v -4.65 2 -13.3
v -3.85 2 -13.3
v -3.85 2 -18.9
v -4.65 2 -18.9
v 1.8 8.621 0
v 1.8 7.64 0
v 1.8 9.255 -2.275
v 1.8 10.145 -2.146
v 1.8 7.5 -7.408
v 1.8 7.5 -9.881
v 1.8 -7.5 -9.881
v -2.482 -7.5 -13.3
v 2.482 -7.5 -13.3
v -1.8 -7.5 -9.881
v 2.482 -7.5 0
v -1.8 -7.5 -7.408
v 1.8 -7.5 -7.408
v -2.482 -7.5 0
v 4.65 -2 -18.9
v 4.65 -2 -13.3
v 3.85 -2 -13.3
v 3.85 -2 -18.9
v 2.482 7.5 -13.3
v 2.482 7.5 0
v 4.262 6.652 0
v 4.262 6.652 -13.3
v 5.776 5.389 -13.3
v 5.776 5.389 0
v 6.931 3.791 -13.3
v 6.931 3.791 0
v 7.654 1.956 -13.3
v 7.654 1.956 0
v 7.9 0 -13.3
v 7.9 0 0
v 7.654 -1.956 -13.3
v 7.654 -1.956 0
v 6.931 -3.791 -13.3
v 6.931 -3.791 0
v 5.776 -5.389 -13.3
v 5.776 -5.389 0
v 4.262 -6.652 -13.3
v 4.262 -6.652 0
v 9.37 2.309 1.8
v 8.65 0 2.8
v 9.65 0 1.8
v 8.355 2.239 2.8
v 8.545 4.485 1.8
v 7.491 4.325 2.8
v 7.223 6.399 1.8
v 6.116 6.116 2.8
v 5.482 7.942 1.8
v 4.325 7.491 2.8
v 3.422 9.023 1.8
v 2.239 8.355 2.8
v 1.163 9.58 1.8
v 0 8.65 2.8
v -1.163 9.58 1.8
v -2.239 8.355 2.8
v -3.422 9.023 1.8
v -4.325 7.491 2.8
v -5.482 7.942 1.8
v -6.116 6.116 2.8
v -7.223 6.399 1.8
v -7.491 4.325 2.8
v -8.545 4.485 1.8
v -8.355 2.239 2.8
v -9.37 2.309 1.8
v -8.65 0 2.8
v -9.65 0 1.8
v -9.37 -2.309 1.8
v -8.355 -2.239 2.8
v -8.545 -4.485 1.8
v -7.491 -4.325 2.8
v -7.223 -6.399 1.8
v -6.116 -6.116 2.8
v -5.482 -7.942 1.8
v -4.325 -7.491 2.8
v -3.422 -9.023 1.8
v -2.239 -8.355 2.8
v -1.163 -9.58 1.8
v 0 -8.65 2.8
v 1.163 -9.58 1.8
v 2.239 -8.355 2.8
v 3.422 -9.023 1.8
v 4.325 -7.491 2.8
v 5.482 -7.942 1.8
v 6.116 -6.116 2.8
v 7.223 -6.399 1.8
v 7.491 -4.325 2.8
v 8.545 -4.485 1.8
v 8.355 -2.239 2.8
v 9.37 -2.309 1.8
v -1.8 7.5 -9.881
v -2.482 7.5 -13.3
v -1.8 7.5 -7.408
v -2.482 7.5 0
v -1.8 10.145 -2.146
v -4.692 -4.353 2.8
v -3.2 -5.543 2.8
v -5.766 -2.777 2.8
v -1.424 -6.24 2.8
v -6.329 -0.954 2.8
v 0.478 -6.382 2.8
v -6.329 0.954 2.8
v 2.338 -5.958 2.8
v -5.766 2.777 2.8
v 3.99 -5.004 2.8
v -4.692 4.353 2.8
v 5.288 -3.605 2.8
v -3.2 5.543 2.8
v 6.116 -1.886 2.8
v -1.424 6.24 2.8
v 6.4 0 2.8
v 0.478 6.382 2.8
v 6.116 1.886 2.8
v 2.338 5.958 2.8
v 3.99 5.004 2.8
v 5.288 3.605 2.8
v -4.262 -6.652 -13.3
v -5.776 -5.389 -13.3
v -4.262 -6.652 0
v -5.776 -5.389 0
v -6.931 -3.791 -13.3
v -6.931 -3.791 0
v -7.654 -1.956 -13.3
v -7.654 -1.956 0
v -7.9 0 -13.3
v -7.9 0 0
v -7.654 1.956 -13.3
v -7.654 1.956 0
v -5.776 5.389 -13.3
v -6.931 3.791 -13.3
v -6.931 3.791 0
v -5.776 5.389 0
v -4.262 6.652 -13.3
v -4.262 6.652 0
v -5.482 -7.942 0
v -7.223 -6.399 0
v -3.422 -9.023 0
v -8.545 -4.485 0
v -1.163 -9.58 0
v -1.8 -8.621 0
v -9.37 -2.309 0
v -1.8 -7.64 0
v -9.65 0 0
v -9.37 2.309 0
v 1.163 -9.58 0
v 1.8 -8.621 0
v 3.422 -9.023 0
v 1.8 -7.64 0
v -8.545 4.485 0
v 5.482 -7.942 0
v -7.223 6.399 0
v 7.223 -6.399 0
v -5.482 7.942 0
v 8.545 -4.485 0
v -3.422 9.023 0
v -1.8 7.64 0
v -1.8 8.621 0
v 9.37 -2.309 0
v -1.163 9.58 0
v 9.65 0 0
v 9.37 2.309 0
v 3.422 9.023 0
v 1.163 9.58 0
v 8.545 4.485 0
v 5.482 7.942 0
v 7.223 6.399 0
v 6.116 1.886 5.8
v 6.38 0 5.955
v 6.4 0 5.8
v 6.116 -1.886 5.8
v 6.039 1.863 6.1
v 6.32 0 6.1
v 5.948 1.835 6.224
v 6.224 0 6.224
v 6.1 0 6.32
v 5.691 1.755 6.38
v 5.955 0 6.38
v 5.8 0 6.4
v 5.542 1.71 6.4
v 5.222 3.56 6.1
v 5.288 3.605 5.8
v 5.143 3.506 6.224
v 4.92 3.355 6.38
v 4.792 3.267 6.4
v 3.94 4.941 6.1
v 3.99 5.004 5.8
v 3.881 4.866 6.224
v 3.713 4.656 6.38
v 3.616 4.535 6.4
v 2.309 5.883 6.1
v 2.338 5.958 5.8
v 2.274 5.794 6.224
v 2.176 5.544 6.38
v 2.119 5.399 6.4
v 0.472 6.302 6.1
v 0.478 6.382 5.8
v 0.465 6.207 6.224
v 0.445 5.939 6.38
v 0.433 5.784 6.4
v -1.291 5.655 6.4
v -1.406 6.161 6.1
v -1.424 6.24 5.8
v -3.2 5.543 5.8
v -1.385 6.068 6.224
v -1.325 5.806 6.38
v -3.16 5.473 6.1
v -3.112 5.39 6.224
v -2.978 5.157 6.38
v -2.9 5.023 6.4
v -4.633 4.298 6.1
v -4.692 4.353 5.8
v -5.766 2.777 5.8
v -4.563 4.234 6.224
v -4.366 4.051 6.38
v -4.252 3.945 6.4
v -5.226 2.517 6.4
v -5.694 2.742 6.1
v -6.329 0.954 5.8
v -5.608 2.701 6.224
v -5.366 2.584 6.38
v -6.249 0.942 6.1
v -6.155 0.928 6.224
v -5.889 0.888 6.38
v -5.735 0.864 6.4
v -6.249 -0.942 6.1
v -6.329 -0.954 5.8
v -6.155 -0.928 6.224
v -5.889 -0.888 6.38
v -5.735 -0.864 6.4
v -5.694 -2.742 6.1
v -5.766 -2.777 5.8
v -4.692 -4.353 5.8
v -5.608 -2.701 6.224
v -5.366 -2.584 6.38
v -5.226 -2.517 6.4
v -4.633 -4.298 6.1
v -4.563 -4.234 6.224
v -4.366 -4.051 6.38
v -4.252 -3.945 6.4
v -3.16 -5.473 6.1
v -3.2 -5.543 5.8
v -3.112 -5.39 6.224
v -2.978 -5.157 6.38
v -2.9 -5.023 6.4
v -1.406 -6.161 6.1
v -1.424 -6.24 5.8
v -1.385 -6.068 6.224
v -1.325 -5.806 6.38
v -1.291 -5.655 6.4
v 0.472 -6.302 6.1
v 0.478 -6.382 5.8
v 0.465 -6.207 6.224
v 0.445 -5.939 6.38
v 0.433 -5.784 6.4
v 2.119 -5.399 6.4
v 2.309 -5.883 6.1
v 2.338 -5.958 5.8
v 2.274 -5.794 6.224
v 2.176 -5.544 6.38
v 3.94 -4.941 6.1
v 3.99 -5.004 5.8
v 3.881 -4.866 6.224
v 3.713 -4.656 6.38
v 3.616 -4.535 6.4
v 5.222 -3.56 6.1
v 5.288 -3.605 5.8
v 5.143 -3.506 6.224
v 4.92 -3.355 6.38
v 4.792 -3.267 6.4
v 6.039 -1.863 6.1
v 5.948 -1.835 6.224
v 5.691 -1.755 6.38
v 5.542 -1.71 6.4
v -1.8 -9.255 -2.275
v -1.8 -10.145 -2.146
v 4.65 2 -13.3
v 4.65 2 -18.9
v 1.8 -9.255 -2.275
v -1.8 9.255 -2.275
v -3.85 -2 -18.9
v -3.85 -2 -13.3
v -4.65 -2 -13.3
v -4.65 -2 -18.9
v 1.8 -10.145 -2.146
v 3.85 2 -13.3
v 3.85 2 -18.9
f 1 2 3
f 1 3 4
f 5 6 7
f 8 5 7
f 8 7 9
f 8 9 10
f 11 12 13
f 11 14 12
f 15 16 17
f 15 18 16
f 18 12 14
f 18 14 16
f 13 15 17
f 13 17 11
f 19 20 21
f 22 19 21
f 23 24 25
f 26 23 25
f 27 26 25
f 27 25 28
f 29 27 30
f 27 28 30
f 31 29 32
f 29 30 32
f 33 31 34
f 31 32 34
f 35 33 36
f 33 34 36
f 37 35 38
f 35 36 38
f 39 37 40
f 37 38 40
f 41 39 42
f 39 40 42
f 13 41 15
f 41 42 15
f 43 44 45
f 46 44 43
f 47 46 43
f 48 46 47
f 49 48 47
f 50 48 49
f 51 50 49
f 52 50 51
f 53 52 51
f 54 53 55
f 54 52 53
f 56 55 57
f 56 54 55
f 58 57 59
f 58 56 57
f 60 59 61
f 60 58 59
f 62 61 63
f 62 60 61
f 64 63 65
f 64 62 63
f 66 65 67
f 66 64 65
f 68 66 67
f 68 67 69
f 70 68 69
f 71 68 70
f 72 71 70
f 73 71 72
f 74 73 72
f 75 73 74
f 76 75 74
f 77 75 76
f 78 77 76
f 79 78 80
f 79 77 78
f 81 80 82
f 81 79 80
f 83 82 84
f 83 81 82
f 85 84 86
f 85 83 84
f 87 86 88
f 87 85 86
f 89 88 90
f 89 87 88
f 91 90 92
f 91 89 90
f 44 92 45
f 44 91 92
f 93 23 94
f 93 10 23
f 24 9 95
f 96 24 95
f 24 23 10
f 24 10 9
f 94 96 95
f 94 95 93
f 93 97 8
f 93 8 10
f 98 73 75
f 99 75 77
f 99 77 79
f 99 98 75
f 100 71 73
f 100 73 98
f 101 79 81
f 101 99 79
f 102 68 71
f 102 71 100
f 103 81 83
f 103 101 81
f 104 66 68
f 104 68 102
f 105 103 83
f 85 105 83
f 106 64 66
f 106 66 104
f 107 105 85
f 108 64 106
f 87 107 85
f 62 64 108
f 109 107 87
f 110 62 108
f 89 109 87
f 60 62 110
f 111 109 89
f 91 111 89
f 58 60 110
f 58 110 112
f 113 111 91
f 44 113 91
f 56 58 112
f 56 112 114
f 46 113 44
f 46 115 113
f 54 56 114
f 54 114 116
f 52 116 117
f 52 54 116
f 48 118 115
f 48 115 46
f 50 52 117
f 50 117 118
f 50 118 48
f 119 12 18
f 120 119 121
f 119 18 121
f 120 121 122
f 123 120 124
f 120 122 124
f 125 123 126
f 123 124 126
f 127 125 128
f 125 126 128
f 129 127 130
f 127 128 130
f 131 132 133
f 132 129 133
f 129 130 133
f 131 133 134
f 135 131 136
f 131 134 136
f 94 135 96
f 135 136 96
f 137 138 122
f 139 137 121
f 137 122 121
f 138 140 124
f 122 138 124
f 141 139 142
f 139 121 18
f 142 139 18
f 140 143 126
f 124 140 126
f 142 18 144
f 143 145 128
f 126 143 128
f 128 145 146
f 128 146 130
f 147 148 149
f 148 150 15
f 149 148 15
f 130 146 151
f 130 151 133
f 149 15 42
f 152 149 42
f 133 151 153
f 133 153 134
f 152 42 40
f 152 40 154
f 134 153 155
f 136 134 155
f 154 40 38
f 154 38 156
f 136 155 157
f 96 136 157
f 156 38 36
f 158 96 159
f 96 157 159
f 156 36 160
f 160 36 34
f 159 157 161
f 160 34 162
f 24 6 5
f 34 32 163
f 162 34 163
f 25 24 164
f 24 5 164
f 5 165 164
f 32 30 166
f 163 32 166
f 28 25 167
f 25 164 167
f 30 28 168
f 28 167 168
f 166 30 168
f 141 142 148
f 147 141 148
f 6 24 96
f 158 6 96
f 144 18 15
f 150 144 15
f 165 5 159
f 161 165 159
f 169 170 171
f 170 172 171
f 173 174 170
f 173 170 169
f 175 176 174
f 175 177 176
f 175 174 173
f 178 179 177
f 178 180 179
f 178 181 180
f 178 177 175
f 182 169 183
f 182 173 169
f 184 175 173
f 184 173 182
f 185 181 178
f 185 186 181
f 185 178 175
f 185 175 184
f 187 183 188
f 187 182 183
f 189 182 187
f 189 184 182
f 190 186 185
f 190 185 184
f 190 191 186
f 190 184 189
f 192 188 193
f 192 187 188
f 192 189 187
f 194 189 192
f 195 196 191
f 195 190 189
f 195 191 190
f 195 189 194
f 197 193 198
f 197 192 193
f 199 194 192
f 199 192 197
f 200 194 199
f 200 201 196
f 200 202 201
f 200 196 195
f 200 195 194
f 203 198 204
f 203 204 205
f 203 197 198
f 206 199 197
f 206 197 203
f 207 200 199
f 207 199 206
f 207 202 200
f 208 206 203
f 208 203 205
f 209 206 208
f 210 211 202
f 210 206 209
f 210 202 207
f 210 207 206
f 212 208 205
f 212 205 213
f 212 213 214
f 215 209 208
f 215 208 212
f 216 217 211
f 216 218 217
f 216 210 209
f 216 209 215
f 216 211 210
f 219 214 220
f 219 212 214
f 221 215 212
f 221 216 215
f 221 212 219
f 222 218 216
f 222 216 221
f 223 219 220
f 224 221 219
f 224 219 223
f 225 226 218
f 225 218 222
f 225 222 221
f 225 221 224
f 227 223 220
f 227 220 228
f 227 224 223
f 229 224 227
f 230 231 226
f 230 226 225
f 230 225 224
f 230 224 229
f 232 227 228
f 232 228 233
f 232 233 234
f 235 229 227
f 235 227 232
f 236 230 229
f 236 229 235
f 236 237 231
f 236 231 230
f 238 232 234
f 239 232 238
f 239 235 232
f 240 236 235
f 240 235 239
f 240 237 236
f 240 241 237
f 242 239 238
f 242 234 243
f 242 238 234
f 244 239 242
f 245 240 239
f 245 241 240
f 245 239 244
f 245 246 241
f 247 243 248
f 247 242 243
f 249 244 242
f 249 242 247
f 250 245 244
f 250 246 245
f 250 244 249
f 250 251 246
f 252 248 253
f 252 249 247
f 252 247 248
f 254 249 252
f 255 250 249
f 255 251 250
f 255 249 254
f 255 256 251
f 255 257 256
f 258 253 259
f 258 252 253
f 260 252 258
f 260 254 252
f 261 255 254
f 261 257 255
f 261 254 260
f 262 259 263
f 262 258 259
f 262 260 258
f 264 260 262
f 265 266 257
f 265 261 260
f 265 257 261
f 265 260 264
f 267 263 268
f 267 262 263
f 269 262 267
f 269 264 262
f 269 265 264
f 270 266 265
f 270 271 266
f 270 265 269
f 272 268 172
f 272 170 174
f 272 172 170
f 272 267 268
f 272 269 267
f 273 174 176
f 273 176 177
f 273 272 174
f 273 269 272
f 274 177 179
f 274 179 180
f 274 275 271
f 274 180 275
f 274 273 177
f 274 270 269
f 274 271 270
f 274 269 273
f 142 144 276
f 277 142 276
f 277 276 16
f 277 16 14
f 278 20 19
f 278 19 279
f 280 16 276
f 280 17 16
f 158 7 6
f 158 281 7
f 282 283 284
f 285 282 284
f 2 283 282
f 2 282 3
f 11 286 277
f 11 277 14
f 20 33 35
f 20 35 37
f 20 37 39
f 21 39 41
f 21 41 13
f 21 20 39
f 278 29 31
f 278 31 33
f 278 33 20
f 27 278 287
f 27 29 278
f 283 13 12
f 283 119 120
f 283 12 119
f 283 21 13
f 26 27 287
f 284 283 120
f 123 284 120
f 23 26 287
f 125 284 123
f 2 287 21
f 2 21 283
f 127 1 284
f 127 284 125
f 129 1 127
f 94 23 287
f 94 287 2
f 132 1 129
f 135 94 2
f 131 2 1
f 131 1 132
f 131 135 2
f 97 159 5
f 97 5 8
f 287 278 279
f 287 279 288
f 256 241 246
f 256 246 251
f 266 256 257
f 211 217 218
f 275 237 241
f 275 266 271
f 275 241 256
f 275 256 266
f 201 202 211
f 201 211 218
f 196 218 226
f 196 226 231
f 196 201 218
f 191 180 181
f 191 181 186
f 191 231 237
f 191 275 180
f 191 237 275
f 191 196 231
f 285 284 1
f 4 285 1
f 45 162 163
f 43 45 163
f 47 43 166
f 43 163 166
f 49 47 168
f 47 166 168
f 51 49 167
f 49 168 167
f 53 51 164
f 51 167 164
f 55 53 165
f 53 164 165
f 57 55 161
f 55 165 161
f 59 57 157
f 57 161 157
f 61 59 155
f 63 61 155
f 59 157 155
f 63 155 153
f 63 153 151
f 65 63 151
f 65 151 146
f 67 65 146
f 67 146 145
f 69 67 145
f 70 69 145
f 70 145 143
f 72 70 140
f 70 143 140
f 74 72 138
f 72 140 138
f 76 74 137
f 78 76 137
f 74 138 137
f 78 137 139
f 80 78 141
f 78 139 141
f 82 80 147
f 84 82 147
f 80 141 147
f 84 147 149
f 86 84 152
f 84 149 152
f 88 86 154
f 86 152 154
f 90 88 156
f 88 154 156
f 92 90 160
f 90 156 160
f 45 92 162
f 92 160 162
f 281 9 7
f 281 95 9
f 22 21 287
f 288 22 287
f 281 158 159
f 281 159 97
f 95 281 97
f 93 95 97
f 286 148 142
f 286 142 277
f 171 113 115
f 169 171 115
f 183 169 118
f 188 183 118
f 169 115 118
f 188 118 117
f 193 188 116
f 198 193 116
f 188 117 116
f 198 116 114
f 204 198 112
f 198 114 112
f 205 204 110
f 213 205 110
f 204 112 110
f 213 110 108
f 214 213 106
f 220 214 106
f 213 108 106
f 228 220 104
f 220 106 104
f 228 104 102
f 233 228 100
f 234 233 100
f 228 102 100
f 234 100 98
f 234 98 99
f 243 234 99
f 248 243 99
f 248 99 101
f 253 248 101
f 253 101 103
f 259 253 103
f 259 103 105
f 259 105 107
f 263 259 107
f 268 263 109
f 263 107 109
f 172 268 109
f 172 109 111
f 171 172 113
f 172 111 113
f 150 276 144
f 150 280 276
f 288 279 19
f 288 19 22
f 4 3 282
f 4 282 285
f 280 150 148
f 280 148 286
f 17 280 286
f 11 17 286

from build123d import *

# Parameters (mm, degrees)
SKETCH1_R           = 9.65
BOSS_EXTRUDE1_DEPTH = 2.8
CHAMFER1_SIZE       = 1
SKETCH2_R           = 6.4
BOSS_EXTRUDE2_DEPTH = 3.6
FILLET1_R           = 0.6
SKETCH3_R           = 7.9
BOSS_EXTRUDE3_DEPTH = 13.3
CUT_EXTRUDE1_START  = -13.3
CUT_EXTRUDE1_DEPTH  = 13.3
SKETCH4_W           = 0.8
SKETCH4_H           = 4
BOSS_EXTRUDE4_DEPTH = 5.6
BOSS_EXTRUDE6_DEPTH = 1.8
CIRPATTERN1_COUNT   = 2


with BuildPart() as part:
    # Sketch1 → Boss-Extrude1 (new body)
    with BuildSketch(Plane.XY):
        Circle(SKETCH1_R)
    extrude(amount=BOSS_EXTRUDE1_DEPTH)

    # Chamfer1
    chamfer1_edges = [part.edges().sort_by_distance(p)[0] for p in [
        (-9.65, 0, 2.8),
    ]]
    chamfer(chamfer1_edges, length=CHAMFER1_SIZE)

    # Sketch2 → Boss-Extrude2 (add)
    with BuildSketch(Plane.XY.offset(2.8)):
        Circle(SKETCH2_R)
    extrude(amount=BOSS_EXTRUDE2_DEPTH)

    # Fillet1
    fillet1_edges = [part.edges().sort_by_distance(p)[0] for p in [
        (-6.4, 0, 6.4),
    ]]
    fillet(fillet1_edges, radius=FILLET1_R)

    # Sketch3 → Boss-Extrude3 (add)
    with BuildSketch(Plane(origin=(0, 0, 0), x_dir=(-1, 0, 0), z_dir=(0, 0, -1))):
        Circle(SKETCH3_R)
    extrude(amount=BOSS_EXTRUDE3_DEPTH)

    # Sketch6 → Cut-Extrude1 (cut)
    with BuildSketch(Plane(origin=(0, 0, -13.3), x_dir=(-1, 0, 0), z_dir=(0, 0, -1)).offset(CUT_EXTRUDE1_START)):
        with BuildLine():
            ThreePointArc((2.481934729, 7.5), (0, 7.9), (-2.481934729, 7.5))
            Line((-2.481934729, 7.5), (2.481934729, 7.5))
        make_face()
        with BuildLine():
            Line((2.481934729, -7.5), (-2.481934729, -7.5))
            ThreePointArc((-2.481934729, -7.5), (0, -7.9), (2.481934729, -7.5))
        make_face()
    extrude(amount=CUT_EXTRUDE1_DEPTH, mode=Mode.SUBTRACT)

    # Sketch4 → Boss-Extrude4 (add)
    with BuildSketch(Plane(origin=(0, 0, -13.3), x_dir=(-1, 0, 0), z_dir=(0, 0, -1))):
        with Locations((4.25, 0)):
            Rectangle(SKETCH4_W, SKETCH4_H)
        with Locations((-4.25, 0)):
            Rectangle(SKETCH4_W, SKETCH4_H)
    extrude(amount=BOSS_EXTRUDE4_DEPTH)

    # Sketch8 → Boss-Extrude6 (add, symmetric)
    with BuildSketch(Plane(origin=(0, 0, 0), x_dir=(0, 0, -1), z_dir=(1, 0, 0))):
        Polygon((0, -7.639808061), (0, -8.620963842), (2.146086769, -10.1447862), (9.881224656, -7.5), (7.408497384, -7.5), (2.275068918, -9.2552138), align=None)
    boss_extrude6 = extrude(amount=BOSS_EXTRUDE6_DEPTH, both=True)

    # CirPattern1: Boss-Extrude6 ×2 about axis
    cirpattern1_axis = Axis((0, 0, -13.3), (0, 0, 1))
    for i in range(1, CIRPATTERN1_COUNT):
        add(boss_extrude6.rotate(cirpattern1_axis, i * 360 / CIRPATTERN1_COUNT))


solid = part.part
